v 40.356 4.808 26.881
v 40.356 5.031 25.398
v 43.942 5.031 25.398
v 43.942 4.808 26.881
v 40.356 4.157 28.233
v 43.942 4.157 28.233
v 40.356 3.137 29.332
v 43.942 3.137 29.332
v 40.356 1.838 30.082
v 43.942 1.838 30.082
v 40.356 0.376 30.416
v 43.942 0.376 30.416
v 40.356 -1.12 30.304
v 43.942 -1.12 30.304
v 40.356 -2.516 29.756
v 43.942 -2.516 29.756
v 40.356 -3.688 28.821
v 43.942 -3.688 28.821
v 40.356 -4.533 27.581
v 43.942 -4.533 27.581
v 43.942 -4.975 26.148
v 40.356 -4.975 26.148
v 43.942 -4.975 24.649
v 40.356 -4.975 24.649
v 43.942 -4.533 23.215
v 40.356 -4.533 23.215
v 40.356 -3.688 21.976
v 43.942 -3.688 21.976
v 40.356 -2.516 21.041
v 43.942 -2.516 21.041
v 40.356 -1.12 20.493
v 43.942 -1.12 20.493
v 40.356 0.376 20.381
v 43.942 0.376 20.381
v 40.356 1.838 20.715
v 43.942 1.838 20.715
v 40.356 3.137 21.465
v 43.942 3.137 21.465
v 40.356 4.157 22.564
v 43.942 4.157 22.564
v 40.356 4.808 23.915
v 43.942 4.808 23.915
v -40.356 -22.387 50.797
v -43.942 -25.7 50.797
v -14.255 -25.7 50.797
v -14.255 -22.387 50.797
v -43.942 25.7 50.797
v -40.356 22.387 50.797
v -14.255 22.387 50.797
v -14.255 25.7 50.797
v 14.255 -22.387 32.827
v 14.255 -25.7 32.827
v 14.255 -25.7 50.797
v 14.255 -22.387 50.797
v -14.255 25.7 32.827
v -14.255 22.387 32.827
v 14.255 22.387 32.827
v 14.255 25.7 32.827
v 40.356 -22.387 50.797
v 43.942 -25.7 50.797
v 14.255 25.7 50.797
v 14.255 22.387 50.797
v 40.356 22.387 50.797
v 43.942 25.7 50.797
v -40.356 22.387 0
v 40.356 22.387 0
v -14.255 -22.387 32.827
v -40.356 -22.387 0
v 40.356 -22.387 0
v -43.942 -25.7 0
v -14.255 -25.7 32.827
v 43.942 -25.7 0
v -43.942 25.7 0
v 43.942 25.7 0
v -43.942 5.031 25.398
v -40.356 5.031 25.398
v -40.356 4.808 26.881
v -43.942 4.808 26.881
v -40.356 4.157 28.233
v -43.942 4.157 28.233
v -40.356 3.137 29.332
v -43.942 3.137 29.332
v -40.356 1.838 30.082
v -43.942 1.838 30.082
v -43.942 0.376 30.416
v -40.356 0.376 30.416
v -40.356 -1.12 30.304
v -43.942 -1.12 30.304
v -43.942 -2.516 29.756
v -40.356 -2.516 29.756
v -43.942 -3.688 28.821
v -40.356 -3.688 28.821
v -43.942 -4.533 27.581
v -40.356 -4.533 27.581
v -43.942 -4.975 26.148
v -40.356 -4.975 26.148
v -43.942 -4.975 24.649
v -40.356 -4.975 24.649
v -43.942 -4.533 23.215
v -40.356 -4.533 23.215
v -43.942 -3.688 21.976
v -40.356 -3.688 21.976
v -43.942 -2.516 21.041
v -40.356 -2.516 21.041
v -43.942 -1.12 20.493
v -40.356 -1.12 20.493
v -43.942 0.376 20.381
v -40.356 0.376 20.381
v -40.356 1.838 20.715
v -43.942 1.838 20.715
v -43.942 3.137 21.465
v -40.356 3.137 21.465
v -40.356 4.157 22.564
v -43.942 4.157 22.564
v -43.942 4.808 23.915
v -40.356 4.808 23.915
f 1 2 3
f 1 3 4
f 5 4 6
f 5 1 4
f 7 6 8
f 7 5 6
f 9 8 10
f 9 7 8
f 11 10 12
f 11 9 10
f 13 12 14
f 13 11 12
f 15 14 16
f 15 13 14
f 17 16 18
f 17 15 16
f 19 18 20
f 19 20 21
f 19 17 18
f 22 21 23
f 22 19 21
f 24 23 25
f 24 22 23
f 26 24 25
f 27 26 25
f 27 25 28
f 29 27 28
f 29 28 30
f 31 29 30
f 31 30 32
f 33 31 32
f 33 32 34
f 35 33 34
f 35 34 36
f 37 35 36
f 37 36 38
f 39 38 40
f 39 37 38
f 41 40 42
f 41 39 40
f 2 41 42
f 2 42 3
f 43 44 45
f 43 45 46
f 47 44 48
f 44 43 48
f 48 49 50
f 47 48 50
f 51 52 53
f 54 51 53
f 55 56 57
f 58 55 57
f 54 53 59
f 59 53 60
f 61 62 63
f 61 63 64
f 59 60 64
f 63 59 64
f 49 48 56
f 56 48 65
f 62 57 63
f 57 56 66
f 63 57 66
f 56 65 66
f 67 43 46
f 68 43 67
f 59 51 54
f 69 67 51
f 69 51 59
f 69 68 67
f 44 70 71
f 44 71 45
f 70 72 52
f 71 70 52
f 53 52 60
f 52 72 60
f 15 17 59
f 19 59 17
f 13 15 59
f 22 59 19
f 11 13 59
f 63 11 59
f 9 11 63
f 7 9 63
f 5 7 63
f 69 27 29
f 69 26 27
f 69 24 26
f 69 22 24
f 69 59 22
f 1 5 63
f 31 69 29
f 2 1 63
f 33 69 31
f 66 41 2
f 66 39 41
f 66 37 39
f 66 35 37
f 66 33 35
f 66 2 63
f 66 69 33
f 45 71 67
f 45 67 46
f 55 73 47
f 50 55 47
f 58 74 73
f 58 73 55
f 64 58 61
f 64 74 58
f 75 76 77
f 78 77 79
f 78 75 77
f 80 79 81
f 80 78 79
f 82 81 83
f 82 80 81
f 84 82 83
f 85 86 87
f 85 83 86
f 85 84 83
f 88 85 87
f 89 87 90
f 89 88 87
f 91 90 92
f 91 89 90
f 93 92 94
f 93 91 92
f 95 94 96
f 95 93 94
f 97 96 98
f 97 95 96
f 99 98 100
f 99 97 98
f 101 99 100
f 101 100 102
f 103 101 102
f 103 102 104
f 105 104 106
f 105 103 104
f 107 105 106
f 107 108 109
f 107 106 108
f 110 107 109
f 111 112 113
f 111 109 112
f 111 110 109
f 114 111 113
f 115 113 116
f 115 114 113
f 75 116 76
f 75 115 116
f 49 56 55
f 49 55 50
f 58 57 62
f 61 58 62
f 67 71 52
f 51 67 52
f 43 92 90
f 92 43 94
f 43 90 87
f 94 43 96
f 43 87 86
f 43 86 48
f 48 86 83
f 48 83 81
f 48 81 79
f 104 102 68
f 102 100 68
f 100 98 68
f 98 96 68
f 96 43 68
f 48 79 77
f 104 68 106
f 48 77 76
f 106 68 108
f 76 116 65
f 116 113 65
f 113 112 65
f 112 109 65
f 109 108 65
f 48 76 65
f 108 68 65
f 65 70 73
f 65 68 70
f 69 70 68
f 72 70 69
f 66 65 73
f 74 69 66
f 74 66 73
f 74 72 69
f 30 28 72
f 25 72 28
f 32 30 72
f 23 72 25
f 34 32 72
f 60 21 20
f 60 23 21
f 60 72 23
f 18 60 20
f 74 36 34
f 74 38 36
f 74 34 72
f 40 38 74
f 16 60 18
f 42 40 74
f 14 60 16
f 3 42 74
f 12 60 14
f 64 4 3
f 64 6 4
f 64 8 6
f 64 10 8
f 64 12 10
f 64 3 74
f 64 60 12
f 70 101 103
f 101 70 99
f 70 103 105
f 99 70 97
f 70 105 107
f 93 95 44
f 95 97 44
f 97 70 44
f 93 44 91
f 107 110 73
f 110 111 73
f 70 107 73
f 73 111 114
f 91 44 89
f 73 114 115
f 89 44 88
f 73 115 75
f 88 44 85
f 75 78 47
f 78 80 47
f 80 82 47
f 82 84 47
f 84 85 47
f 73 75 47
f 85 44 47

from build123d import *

# Parameters (mm, degrees)
F0_W     = 51.3991490006
F0_H     = 50.7968105376
F0_R     = 5.0314784616
F1_DEPTH = 43.942
F2_W     = 28.5104624927
F2_H     = 18.070012331
F3_DEPTH = 25.908
F4_W     = 80.7127282023
F4_H     = 44.773478061
F5_DEPTH = 84.836


with BuildPart() as f1:
    # F0 (on Right) → F1 (new body, symmetric)
    with BuildSketch(Plane.YZ):
        with Locations((0, 25.3984052688)):
            Rectangle(F0_W, F0_H)
        with Locations((0, 25.3984052688)):
            Circle(F0_R, mode=Mode.SUBTRACT)
    extrude(amount=F1_DEPTH, both=True)

    # F2 (on Front) → F3 (cut, symmetric)
    with BuildSketch(Plane.XZ):
        with Locations((0, 41.862193495)):
            Rectangle(F2_W, F2_H)
    extrude(amount=F3_DEPTH, both=True, mode=Mode.SUBTRACT)

    # F4 (on Top) → F5 (cut)
    with BuildSketch(Plane.XY):
        Rectangle(F4_W, F4_H)
    extrude(amount=F5_DEPTH, mode=Mode.SUBTRACT)


solid = f1.part
